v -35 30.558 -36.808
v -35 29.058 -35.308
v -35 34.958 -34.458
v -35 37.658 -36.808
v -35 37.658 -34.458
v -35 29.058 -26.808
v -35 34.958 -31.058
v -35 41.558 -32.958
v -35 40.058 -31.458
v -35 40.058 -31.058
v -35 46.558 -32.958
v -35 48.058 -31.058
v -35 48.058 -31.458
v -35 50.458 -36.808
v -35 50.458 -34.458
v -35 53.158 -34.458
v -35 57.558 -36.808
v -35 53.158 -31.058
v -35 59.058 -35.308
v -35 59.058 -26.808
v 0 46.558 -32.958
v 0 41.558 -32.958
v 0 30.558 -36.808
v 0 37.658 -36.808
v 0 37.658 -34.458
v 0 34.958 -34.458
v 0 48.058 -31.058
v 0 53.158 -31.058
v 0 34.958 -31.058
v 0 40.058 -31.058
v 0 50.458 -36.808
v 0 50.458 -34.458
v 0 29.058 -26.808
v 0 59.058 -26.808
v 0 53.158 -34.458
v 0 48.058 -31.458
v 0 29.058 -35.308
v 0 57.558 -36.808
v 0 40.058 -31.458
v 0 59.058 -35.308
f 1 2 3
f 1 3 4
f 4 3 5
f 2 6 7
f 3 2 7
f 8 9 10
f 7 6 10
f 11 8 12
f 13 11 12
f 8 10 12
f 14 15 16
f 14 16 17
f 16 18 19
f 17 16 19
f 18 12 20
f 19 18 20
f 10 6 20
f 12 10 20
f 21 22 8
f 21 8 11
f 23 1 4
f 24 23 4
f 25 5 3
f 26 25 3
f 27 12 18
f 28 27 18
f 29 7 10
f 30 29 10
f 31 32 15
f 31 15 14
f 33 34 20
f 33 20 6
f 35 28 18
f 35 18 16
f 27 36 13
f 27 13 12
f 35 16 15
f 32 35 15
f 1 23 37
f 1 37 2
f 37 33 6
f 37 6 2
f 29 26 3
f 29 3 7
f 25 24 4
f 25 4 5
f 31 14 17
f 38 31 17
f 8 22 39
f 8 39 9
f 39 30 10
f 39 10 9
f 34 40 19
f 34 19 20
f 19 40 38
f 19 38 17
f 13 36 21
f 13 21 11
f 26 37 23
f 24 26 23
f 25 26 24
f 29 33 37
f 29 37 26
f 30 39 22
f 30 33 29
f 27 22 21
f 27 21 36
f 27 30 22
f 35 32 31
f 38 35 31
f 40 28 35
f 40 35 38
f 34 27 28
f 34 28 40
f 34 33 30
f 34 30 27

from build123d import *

# Parameters (mm, degrees)
F1_DEPTH = 35
F2_SIZE  = 1.5


with BuildPart() as f1:
    # F0 (on Right) → F1 (new body)
    with BuildSketch(Plane.YZ):
        Polygon((43.557955, -26.808144), (29.057955, -26.808144), (29.057955, -36.808144), (37.657955, -36.808144), (37.657955, -34.458144), (34.957955, -34.458144), (34.957955, -31.058144), (40.057955, -31.058144), (40.057955, -32.958144), (48.057955, -32.958144), (48.057955, -31.058144), (53.157955, -31.058144), (53.157955, -34.458144), (50.457955, -34.458144), (50.457955, -36.808144), (59.057955, -36.808144), (59.057955, -26.808144), (44.557955, -26.808144), align=None)
    extrude(amount=-F1_DEPTH)

    # F2
    f2_edges = [f1.edges().sort_by_distance(p)[0] for p in [
        (-17.5, 59.057955, -36.808144),
        (-17.5, 48.057955, -32.958144),
        (-17.5, 40.057955, -32.958144),
        (-17.5, 29.057955, -36.808144),
    ]]
    chamfer(f2_edges, length=F2_SIZE)


solid = f1.part
